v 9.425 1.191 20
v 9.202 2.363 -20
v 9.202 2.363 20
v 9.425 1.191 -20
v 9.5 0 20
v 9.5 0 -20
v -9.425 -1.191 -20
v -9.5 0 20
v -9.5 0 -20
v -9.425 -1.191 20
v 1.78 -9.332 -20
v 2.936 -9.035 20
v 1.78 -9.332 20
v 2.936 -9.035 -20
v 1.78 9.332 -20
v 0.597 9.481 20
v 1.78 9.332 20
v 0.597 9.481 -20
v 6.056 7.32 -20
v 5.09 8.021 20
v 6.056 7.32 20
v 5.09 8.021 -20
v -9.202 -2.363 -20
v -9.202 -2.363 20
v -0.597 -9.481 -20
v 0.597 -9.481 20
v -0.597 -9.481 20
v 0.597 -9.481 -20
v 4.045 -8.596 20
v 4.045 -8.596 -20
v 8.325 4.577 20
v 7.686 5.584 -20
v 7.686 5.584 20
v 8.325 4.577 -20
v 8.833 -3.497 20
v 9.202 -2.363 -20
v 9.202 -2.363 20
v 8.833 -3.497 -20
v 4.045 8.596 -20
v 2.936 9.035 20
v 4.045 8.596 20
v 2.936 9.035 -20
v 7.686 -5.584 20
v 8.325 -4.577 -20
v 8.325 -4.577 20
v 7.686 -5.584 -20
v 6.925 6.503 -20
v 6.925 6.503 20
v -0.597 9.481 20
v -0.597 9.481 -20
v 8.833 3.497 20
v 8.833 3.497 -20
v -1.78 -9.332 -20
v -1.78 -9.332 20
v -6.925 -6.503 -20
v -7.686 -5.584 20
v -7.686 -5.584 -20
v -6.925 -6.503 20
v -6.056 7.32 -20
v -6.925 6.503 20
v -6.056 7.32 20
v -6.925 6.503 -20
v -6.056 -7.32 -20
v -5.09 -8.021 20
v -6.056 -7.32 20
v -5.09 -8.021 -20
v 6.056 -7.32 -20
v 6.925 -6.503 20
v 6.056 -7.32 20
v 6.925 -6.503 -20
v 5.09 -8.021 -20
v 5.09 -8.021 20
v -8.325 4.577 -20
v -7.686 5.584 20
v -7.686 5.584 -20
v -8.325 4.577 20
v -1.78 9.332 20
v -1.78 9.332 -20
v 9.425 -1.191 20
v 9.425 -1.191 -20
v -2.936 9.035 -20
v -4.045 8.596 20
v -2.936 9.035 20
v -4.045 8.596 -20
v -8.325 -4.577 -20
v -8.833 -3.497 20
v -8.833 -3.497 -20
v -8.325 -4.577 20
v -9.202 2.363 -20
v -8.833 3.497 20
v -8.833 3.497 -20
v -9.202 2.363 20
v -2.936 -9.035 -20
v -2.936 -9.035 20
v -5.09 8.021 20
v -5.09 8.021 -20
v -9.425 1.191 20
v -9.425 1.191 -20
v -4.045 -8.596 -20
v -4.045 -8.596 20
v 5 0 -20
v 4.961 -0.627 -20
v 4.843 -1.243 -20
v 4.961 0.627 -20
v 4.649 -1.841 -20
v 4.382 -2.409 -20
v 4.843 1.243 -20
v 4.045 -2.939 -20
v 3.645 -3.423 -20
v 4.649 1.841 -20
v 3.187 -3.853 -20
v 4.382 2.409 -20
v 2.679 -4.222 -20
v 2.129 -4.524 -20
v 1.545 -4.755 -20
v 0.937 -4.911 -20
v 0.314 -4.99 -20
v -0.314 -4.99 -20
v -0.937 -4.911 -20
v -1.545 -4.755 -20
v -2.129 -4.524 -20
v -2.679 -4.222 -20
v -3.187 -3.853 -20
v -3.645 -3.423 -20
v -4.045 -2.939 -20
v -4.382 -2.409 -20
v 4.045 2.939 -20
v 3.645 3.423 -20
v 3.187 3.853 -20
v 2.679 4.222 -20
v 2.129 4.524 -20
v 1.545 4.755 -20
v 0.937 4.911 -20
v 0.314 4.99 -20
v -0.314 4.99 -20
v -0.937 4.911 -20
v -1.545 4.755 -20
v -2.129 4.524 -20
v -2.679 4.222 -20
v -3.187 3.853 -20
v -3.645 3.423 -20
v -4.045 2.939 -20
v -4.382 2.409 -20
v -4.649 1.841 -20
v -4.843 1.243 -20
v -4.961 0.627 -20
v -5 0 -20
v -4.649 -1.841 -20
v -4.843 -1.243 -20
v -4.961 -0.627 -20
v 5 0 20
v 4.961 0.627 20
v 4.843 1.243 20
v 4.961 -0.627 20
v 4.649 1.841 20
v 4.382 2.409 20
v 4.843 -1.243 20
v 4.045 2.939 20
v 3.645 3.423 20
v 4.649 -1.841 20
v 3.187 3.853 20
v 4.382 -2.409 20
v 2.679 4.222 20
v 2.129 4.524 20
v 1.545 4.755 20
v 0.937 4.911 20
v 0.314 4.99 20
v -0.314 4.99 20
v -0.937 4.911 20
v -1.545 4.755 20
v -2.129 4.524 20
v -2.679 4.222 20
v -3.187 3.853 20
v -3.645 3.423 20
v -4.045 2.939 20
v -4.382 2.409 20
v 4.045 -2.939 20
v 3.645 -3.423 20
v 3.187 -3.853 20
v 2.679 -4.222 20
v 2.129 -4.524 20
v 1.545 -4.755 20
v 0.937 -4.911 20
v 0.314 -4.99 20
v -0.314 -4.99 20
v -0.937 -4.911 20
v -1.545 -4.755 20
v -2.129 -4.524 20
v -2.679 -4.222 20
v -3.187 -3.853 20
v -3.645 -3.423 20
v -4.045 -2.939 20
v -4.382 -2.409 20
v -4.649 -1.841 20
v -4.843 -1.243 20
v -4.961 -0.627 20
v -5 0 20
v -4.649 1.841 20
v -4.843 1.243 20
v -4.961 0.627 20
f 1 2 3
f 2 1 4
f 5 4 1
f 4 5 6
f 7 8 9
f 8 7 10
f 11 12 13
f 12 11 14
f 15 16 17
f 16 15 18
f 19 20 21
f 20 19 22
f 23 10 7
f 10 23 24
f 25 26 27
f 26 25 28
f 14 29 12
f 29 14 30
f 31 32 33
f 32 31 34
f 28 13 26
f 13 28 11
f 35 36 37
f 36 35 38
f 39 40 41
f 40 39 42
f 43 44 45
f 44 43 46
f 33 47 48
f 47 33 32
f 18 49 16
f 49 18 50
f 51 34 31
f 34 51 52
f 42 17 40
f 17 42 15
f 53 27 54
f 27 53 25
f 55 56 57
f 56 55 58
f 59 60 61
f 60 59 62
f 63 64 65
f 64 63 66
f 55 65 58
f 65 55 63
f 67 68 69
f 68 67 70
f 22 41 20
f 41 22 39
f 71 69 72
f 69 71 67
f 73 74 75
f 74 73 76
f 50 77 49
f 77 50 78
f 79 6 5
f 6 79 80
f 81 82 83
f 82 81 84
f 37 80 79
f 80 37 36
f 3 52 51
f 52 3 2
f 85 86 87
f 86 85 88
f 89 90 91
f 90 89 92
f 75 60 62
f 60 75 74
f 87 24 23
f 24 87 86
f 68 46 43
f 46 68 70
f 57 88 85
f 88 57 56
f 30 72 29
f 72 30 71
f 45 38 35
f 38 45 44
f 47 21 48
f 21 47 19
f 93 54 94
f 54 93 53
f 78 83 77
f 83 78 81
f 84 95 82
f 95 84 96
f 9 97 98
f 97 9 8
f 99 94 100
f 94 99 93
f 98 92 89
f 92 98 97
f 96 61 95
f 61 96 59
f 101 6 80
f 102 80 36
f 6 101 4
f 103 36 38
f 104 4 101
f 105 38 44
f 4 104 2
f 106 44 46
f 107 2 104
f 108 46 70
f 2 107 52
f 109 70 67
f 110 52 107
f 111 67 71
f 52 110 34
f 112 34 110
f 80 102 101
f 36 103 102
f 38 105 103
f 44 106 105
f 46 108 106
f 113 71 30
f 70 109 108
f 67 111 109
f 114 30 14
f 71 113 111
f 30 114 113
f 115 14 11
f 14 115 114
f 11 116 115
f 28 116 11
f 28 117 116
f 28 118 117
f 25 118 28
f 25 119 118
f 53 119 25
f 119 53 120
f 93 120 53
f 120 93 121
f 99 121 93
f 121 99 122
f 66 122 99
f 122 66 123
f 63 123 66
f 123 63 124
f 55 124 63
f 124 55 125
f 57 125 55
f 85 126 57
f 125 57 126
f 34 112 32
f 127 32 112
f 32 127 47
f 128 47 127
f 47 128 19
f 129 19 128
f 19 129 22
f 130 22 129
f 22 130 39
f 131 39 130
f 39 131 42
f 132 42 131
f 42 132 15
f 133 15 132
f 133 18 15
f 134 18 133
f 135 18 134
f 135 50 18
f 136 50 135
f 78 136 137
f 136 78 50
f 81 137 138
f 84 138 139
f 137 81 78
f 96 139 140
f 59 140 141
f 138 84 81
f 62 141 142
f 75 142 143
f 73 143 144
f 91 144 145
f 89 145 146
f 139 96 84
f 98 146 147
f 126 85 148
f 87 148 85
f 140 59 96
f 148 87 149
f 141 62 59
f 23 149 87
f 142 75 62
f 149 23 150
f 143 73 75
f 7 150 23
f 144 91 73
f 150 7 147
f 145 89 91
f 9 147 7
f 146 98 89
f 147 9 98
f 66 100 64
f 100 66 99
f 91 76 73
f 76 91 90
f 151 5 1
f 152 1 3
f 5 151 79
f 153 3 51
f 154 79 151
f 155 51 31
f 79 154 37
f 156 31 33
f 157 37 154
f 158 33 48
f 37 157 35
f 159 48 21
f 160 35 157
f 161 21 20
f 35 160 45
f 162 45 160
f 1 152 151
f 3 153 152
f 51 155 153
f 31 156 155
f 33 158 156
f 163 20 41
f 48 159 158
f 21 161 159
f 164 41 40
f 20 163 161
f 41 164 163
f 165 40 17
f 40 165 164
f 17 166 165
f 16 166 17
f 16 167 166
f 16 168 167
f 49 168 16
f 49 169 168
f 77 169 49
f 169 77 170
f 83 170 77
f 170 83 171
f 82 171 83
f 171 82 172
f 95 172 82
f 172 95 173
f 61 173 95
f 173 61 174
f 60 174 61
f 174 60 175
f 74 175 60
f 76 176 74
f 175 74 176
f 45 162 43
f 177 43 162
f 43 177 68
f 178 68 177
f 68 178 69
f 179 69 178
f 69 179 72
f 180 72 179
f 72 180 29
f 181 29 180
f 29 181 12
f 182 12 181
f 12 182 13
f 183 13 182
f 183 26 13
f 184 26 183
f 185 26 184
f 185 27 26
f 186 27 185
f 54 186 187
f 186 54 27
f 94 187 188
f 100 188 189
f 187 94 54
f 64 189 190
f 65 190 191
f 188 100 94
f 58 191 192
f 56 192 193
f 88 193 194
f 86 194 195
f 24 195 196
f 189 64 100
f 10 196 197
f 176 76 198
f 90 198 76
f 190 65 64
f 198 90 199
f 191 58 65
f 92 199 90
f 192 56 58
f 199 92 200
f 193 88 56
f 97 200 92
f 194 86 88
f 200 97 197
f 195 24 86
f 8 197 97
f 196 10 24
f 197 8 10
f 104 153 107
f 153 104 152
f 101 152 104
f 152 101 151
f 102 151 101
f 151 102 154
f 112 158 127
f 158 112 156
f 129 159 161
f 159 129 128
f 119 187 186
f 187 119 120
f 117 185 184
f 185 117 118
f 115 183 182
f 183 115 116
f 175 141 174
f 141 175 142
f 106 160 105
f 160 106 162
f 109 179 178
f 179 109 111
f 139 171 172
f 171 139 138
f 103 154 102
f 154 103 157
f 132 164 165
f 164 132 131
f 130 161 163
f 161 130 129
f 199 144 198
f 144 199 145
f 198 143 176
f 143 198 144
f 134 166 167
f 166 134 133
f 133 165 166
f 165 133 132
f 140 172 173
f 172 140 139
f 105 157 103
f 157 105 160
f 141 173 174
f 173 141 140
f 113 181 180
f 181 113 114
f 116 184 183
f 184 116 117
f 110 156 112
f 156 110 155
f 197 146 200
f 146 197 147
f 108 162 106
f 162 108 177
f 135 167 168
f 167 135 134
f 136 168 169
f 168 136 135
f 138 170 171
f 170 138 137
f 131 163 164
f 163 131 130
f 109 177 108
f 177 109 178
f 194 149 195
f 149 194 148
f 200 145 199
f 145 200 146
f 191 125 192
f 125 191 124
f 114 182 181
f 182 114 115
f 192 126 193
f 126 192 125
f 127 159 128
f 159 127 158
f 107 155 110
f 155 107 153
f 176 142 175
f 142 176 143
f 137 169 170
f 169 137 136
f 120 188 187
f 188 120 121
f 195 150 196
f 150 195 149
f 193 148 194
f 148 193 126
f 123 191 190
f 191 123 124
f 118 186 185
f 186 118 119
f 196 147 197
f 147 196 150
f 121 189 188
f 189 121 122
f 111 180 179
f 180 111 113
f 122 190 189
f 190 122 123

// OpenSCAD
$fn = 50;


difference() {
	union() {
		translate(v = [0, 0, -20.0000000000]) {
			cylinder(h = 40, r = 9.5000000000);
		}
	}
	union() {
		translate(v = [0, 0, -100.0000000000]) {
			cylinder(h = 200, r = 5.0000000000);
		}
	}
}
